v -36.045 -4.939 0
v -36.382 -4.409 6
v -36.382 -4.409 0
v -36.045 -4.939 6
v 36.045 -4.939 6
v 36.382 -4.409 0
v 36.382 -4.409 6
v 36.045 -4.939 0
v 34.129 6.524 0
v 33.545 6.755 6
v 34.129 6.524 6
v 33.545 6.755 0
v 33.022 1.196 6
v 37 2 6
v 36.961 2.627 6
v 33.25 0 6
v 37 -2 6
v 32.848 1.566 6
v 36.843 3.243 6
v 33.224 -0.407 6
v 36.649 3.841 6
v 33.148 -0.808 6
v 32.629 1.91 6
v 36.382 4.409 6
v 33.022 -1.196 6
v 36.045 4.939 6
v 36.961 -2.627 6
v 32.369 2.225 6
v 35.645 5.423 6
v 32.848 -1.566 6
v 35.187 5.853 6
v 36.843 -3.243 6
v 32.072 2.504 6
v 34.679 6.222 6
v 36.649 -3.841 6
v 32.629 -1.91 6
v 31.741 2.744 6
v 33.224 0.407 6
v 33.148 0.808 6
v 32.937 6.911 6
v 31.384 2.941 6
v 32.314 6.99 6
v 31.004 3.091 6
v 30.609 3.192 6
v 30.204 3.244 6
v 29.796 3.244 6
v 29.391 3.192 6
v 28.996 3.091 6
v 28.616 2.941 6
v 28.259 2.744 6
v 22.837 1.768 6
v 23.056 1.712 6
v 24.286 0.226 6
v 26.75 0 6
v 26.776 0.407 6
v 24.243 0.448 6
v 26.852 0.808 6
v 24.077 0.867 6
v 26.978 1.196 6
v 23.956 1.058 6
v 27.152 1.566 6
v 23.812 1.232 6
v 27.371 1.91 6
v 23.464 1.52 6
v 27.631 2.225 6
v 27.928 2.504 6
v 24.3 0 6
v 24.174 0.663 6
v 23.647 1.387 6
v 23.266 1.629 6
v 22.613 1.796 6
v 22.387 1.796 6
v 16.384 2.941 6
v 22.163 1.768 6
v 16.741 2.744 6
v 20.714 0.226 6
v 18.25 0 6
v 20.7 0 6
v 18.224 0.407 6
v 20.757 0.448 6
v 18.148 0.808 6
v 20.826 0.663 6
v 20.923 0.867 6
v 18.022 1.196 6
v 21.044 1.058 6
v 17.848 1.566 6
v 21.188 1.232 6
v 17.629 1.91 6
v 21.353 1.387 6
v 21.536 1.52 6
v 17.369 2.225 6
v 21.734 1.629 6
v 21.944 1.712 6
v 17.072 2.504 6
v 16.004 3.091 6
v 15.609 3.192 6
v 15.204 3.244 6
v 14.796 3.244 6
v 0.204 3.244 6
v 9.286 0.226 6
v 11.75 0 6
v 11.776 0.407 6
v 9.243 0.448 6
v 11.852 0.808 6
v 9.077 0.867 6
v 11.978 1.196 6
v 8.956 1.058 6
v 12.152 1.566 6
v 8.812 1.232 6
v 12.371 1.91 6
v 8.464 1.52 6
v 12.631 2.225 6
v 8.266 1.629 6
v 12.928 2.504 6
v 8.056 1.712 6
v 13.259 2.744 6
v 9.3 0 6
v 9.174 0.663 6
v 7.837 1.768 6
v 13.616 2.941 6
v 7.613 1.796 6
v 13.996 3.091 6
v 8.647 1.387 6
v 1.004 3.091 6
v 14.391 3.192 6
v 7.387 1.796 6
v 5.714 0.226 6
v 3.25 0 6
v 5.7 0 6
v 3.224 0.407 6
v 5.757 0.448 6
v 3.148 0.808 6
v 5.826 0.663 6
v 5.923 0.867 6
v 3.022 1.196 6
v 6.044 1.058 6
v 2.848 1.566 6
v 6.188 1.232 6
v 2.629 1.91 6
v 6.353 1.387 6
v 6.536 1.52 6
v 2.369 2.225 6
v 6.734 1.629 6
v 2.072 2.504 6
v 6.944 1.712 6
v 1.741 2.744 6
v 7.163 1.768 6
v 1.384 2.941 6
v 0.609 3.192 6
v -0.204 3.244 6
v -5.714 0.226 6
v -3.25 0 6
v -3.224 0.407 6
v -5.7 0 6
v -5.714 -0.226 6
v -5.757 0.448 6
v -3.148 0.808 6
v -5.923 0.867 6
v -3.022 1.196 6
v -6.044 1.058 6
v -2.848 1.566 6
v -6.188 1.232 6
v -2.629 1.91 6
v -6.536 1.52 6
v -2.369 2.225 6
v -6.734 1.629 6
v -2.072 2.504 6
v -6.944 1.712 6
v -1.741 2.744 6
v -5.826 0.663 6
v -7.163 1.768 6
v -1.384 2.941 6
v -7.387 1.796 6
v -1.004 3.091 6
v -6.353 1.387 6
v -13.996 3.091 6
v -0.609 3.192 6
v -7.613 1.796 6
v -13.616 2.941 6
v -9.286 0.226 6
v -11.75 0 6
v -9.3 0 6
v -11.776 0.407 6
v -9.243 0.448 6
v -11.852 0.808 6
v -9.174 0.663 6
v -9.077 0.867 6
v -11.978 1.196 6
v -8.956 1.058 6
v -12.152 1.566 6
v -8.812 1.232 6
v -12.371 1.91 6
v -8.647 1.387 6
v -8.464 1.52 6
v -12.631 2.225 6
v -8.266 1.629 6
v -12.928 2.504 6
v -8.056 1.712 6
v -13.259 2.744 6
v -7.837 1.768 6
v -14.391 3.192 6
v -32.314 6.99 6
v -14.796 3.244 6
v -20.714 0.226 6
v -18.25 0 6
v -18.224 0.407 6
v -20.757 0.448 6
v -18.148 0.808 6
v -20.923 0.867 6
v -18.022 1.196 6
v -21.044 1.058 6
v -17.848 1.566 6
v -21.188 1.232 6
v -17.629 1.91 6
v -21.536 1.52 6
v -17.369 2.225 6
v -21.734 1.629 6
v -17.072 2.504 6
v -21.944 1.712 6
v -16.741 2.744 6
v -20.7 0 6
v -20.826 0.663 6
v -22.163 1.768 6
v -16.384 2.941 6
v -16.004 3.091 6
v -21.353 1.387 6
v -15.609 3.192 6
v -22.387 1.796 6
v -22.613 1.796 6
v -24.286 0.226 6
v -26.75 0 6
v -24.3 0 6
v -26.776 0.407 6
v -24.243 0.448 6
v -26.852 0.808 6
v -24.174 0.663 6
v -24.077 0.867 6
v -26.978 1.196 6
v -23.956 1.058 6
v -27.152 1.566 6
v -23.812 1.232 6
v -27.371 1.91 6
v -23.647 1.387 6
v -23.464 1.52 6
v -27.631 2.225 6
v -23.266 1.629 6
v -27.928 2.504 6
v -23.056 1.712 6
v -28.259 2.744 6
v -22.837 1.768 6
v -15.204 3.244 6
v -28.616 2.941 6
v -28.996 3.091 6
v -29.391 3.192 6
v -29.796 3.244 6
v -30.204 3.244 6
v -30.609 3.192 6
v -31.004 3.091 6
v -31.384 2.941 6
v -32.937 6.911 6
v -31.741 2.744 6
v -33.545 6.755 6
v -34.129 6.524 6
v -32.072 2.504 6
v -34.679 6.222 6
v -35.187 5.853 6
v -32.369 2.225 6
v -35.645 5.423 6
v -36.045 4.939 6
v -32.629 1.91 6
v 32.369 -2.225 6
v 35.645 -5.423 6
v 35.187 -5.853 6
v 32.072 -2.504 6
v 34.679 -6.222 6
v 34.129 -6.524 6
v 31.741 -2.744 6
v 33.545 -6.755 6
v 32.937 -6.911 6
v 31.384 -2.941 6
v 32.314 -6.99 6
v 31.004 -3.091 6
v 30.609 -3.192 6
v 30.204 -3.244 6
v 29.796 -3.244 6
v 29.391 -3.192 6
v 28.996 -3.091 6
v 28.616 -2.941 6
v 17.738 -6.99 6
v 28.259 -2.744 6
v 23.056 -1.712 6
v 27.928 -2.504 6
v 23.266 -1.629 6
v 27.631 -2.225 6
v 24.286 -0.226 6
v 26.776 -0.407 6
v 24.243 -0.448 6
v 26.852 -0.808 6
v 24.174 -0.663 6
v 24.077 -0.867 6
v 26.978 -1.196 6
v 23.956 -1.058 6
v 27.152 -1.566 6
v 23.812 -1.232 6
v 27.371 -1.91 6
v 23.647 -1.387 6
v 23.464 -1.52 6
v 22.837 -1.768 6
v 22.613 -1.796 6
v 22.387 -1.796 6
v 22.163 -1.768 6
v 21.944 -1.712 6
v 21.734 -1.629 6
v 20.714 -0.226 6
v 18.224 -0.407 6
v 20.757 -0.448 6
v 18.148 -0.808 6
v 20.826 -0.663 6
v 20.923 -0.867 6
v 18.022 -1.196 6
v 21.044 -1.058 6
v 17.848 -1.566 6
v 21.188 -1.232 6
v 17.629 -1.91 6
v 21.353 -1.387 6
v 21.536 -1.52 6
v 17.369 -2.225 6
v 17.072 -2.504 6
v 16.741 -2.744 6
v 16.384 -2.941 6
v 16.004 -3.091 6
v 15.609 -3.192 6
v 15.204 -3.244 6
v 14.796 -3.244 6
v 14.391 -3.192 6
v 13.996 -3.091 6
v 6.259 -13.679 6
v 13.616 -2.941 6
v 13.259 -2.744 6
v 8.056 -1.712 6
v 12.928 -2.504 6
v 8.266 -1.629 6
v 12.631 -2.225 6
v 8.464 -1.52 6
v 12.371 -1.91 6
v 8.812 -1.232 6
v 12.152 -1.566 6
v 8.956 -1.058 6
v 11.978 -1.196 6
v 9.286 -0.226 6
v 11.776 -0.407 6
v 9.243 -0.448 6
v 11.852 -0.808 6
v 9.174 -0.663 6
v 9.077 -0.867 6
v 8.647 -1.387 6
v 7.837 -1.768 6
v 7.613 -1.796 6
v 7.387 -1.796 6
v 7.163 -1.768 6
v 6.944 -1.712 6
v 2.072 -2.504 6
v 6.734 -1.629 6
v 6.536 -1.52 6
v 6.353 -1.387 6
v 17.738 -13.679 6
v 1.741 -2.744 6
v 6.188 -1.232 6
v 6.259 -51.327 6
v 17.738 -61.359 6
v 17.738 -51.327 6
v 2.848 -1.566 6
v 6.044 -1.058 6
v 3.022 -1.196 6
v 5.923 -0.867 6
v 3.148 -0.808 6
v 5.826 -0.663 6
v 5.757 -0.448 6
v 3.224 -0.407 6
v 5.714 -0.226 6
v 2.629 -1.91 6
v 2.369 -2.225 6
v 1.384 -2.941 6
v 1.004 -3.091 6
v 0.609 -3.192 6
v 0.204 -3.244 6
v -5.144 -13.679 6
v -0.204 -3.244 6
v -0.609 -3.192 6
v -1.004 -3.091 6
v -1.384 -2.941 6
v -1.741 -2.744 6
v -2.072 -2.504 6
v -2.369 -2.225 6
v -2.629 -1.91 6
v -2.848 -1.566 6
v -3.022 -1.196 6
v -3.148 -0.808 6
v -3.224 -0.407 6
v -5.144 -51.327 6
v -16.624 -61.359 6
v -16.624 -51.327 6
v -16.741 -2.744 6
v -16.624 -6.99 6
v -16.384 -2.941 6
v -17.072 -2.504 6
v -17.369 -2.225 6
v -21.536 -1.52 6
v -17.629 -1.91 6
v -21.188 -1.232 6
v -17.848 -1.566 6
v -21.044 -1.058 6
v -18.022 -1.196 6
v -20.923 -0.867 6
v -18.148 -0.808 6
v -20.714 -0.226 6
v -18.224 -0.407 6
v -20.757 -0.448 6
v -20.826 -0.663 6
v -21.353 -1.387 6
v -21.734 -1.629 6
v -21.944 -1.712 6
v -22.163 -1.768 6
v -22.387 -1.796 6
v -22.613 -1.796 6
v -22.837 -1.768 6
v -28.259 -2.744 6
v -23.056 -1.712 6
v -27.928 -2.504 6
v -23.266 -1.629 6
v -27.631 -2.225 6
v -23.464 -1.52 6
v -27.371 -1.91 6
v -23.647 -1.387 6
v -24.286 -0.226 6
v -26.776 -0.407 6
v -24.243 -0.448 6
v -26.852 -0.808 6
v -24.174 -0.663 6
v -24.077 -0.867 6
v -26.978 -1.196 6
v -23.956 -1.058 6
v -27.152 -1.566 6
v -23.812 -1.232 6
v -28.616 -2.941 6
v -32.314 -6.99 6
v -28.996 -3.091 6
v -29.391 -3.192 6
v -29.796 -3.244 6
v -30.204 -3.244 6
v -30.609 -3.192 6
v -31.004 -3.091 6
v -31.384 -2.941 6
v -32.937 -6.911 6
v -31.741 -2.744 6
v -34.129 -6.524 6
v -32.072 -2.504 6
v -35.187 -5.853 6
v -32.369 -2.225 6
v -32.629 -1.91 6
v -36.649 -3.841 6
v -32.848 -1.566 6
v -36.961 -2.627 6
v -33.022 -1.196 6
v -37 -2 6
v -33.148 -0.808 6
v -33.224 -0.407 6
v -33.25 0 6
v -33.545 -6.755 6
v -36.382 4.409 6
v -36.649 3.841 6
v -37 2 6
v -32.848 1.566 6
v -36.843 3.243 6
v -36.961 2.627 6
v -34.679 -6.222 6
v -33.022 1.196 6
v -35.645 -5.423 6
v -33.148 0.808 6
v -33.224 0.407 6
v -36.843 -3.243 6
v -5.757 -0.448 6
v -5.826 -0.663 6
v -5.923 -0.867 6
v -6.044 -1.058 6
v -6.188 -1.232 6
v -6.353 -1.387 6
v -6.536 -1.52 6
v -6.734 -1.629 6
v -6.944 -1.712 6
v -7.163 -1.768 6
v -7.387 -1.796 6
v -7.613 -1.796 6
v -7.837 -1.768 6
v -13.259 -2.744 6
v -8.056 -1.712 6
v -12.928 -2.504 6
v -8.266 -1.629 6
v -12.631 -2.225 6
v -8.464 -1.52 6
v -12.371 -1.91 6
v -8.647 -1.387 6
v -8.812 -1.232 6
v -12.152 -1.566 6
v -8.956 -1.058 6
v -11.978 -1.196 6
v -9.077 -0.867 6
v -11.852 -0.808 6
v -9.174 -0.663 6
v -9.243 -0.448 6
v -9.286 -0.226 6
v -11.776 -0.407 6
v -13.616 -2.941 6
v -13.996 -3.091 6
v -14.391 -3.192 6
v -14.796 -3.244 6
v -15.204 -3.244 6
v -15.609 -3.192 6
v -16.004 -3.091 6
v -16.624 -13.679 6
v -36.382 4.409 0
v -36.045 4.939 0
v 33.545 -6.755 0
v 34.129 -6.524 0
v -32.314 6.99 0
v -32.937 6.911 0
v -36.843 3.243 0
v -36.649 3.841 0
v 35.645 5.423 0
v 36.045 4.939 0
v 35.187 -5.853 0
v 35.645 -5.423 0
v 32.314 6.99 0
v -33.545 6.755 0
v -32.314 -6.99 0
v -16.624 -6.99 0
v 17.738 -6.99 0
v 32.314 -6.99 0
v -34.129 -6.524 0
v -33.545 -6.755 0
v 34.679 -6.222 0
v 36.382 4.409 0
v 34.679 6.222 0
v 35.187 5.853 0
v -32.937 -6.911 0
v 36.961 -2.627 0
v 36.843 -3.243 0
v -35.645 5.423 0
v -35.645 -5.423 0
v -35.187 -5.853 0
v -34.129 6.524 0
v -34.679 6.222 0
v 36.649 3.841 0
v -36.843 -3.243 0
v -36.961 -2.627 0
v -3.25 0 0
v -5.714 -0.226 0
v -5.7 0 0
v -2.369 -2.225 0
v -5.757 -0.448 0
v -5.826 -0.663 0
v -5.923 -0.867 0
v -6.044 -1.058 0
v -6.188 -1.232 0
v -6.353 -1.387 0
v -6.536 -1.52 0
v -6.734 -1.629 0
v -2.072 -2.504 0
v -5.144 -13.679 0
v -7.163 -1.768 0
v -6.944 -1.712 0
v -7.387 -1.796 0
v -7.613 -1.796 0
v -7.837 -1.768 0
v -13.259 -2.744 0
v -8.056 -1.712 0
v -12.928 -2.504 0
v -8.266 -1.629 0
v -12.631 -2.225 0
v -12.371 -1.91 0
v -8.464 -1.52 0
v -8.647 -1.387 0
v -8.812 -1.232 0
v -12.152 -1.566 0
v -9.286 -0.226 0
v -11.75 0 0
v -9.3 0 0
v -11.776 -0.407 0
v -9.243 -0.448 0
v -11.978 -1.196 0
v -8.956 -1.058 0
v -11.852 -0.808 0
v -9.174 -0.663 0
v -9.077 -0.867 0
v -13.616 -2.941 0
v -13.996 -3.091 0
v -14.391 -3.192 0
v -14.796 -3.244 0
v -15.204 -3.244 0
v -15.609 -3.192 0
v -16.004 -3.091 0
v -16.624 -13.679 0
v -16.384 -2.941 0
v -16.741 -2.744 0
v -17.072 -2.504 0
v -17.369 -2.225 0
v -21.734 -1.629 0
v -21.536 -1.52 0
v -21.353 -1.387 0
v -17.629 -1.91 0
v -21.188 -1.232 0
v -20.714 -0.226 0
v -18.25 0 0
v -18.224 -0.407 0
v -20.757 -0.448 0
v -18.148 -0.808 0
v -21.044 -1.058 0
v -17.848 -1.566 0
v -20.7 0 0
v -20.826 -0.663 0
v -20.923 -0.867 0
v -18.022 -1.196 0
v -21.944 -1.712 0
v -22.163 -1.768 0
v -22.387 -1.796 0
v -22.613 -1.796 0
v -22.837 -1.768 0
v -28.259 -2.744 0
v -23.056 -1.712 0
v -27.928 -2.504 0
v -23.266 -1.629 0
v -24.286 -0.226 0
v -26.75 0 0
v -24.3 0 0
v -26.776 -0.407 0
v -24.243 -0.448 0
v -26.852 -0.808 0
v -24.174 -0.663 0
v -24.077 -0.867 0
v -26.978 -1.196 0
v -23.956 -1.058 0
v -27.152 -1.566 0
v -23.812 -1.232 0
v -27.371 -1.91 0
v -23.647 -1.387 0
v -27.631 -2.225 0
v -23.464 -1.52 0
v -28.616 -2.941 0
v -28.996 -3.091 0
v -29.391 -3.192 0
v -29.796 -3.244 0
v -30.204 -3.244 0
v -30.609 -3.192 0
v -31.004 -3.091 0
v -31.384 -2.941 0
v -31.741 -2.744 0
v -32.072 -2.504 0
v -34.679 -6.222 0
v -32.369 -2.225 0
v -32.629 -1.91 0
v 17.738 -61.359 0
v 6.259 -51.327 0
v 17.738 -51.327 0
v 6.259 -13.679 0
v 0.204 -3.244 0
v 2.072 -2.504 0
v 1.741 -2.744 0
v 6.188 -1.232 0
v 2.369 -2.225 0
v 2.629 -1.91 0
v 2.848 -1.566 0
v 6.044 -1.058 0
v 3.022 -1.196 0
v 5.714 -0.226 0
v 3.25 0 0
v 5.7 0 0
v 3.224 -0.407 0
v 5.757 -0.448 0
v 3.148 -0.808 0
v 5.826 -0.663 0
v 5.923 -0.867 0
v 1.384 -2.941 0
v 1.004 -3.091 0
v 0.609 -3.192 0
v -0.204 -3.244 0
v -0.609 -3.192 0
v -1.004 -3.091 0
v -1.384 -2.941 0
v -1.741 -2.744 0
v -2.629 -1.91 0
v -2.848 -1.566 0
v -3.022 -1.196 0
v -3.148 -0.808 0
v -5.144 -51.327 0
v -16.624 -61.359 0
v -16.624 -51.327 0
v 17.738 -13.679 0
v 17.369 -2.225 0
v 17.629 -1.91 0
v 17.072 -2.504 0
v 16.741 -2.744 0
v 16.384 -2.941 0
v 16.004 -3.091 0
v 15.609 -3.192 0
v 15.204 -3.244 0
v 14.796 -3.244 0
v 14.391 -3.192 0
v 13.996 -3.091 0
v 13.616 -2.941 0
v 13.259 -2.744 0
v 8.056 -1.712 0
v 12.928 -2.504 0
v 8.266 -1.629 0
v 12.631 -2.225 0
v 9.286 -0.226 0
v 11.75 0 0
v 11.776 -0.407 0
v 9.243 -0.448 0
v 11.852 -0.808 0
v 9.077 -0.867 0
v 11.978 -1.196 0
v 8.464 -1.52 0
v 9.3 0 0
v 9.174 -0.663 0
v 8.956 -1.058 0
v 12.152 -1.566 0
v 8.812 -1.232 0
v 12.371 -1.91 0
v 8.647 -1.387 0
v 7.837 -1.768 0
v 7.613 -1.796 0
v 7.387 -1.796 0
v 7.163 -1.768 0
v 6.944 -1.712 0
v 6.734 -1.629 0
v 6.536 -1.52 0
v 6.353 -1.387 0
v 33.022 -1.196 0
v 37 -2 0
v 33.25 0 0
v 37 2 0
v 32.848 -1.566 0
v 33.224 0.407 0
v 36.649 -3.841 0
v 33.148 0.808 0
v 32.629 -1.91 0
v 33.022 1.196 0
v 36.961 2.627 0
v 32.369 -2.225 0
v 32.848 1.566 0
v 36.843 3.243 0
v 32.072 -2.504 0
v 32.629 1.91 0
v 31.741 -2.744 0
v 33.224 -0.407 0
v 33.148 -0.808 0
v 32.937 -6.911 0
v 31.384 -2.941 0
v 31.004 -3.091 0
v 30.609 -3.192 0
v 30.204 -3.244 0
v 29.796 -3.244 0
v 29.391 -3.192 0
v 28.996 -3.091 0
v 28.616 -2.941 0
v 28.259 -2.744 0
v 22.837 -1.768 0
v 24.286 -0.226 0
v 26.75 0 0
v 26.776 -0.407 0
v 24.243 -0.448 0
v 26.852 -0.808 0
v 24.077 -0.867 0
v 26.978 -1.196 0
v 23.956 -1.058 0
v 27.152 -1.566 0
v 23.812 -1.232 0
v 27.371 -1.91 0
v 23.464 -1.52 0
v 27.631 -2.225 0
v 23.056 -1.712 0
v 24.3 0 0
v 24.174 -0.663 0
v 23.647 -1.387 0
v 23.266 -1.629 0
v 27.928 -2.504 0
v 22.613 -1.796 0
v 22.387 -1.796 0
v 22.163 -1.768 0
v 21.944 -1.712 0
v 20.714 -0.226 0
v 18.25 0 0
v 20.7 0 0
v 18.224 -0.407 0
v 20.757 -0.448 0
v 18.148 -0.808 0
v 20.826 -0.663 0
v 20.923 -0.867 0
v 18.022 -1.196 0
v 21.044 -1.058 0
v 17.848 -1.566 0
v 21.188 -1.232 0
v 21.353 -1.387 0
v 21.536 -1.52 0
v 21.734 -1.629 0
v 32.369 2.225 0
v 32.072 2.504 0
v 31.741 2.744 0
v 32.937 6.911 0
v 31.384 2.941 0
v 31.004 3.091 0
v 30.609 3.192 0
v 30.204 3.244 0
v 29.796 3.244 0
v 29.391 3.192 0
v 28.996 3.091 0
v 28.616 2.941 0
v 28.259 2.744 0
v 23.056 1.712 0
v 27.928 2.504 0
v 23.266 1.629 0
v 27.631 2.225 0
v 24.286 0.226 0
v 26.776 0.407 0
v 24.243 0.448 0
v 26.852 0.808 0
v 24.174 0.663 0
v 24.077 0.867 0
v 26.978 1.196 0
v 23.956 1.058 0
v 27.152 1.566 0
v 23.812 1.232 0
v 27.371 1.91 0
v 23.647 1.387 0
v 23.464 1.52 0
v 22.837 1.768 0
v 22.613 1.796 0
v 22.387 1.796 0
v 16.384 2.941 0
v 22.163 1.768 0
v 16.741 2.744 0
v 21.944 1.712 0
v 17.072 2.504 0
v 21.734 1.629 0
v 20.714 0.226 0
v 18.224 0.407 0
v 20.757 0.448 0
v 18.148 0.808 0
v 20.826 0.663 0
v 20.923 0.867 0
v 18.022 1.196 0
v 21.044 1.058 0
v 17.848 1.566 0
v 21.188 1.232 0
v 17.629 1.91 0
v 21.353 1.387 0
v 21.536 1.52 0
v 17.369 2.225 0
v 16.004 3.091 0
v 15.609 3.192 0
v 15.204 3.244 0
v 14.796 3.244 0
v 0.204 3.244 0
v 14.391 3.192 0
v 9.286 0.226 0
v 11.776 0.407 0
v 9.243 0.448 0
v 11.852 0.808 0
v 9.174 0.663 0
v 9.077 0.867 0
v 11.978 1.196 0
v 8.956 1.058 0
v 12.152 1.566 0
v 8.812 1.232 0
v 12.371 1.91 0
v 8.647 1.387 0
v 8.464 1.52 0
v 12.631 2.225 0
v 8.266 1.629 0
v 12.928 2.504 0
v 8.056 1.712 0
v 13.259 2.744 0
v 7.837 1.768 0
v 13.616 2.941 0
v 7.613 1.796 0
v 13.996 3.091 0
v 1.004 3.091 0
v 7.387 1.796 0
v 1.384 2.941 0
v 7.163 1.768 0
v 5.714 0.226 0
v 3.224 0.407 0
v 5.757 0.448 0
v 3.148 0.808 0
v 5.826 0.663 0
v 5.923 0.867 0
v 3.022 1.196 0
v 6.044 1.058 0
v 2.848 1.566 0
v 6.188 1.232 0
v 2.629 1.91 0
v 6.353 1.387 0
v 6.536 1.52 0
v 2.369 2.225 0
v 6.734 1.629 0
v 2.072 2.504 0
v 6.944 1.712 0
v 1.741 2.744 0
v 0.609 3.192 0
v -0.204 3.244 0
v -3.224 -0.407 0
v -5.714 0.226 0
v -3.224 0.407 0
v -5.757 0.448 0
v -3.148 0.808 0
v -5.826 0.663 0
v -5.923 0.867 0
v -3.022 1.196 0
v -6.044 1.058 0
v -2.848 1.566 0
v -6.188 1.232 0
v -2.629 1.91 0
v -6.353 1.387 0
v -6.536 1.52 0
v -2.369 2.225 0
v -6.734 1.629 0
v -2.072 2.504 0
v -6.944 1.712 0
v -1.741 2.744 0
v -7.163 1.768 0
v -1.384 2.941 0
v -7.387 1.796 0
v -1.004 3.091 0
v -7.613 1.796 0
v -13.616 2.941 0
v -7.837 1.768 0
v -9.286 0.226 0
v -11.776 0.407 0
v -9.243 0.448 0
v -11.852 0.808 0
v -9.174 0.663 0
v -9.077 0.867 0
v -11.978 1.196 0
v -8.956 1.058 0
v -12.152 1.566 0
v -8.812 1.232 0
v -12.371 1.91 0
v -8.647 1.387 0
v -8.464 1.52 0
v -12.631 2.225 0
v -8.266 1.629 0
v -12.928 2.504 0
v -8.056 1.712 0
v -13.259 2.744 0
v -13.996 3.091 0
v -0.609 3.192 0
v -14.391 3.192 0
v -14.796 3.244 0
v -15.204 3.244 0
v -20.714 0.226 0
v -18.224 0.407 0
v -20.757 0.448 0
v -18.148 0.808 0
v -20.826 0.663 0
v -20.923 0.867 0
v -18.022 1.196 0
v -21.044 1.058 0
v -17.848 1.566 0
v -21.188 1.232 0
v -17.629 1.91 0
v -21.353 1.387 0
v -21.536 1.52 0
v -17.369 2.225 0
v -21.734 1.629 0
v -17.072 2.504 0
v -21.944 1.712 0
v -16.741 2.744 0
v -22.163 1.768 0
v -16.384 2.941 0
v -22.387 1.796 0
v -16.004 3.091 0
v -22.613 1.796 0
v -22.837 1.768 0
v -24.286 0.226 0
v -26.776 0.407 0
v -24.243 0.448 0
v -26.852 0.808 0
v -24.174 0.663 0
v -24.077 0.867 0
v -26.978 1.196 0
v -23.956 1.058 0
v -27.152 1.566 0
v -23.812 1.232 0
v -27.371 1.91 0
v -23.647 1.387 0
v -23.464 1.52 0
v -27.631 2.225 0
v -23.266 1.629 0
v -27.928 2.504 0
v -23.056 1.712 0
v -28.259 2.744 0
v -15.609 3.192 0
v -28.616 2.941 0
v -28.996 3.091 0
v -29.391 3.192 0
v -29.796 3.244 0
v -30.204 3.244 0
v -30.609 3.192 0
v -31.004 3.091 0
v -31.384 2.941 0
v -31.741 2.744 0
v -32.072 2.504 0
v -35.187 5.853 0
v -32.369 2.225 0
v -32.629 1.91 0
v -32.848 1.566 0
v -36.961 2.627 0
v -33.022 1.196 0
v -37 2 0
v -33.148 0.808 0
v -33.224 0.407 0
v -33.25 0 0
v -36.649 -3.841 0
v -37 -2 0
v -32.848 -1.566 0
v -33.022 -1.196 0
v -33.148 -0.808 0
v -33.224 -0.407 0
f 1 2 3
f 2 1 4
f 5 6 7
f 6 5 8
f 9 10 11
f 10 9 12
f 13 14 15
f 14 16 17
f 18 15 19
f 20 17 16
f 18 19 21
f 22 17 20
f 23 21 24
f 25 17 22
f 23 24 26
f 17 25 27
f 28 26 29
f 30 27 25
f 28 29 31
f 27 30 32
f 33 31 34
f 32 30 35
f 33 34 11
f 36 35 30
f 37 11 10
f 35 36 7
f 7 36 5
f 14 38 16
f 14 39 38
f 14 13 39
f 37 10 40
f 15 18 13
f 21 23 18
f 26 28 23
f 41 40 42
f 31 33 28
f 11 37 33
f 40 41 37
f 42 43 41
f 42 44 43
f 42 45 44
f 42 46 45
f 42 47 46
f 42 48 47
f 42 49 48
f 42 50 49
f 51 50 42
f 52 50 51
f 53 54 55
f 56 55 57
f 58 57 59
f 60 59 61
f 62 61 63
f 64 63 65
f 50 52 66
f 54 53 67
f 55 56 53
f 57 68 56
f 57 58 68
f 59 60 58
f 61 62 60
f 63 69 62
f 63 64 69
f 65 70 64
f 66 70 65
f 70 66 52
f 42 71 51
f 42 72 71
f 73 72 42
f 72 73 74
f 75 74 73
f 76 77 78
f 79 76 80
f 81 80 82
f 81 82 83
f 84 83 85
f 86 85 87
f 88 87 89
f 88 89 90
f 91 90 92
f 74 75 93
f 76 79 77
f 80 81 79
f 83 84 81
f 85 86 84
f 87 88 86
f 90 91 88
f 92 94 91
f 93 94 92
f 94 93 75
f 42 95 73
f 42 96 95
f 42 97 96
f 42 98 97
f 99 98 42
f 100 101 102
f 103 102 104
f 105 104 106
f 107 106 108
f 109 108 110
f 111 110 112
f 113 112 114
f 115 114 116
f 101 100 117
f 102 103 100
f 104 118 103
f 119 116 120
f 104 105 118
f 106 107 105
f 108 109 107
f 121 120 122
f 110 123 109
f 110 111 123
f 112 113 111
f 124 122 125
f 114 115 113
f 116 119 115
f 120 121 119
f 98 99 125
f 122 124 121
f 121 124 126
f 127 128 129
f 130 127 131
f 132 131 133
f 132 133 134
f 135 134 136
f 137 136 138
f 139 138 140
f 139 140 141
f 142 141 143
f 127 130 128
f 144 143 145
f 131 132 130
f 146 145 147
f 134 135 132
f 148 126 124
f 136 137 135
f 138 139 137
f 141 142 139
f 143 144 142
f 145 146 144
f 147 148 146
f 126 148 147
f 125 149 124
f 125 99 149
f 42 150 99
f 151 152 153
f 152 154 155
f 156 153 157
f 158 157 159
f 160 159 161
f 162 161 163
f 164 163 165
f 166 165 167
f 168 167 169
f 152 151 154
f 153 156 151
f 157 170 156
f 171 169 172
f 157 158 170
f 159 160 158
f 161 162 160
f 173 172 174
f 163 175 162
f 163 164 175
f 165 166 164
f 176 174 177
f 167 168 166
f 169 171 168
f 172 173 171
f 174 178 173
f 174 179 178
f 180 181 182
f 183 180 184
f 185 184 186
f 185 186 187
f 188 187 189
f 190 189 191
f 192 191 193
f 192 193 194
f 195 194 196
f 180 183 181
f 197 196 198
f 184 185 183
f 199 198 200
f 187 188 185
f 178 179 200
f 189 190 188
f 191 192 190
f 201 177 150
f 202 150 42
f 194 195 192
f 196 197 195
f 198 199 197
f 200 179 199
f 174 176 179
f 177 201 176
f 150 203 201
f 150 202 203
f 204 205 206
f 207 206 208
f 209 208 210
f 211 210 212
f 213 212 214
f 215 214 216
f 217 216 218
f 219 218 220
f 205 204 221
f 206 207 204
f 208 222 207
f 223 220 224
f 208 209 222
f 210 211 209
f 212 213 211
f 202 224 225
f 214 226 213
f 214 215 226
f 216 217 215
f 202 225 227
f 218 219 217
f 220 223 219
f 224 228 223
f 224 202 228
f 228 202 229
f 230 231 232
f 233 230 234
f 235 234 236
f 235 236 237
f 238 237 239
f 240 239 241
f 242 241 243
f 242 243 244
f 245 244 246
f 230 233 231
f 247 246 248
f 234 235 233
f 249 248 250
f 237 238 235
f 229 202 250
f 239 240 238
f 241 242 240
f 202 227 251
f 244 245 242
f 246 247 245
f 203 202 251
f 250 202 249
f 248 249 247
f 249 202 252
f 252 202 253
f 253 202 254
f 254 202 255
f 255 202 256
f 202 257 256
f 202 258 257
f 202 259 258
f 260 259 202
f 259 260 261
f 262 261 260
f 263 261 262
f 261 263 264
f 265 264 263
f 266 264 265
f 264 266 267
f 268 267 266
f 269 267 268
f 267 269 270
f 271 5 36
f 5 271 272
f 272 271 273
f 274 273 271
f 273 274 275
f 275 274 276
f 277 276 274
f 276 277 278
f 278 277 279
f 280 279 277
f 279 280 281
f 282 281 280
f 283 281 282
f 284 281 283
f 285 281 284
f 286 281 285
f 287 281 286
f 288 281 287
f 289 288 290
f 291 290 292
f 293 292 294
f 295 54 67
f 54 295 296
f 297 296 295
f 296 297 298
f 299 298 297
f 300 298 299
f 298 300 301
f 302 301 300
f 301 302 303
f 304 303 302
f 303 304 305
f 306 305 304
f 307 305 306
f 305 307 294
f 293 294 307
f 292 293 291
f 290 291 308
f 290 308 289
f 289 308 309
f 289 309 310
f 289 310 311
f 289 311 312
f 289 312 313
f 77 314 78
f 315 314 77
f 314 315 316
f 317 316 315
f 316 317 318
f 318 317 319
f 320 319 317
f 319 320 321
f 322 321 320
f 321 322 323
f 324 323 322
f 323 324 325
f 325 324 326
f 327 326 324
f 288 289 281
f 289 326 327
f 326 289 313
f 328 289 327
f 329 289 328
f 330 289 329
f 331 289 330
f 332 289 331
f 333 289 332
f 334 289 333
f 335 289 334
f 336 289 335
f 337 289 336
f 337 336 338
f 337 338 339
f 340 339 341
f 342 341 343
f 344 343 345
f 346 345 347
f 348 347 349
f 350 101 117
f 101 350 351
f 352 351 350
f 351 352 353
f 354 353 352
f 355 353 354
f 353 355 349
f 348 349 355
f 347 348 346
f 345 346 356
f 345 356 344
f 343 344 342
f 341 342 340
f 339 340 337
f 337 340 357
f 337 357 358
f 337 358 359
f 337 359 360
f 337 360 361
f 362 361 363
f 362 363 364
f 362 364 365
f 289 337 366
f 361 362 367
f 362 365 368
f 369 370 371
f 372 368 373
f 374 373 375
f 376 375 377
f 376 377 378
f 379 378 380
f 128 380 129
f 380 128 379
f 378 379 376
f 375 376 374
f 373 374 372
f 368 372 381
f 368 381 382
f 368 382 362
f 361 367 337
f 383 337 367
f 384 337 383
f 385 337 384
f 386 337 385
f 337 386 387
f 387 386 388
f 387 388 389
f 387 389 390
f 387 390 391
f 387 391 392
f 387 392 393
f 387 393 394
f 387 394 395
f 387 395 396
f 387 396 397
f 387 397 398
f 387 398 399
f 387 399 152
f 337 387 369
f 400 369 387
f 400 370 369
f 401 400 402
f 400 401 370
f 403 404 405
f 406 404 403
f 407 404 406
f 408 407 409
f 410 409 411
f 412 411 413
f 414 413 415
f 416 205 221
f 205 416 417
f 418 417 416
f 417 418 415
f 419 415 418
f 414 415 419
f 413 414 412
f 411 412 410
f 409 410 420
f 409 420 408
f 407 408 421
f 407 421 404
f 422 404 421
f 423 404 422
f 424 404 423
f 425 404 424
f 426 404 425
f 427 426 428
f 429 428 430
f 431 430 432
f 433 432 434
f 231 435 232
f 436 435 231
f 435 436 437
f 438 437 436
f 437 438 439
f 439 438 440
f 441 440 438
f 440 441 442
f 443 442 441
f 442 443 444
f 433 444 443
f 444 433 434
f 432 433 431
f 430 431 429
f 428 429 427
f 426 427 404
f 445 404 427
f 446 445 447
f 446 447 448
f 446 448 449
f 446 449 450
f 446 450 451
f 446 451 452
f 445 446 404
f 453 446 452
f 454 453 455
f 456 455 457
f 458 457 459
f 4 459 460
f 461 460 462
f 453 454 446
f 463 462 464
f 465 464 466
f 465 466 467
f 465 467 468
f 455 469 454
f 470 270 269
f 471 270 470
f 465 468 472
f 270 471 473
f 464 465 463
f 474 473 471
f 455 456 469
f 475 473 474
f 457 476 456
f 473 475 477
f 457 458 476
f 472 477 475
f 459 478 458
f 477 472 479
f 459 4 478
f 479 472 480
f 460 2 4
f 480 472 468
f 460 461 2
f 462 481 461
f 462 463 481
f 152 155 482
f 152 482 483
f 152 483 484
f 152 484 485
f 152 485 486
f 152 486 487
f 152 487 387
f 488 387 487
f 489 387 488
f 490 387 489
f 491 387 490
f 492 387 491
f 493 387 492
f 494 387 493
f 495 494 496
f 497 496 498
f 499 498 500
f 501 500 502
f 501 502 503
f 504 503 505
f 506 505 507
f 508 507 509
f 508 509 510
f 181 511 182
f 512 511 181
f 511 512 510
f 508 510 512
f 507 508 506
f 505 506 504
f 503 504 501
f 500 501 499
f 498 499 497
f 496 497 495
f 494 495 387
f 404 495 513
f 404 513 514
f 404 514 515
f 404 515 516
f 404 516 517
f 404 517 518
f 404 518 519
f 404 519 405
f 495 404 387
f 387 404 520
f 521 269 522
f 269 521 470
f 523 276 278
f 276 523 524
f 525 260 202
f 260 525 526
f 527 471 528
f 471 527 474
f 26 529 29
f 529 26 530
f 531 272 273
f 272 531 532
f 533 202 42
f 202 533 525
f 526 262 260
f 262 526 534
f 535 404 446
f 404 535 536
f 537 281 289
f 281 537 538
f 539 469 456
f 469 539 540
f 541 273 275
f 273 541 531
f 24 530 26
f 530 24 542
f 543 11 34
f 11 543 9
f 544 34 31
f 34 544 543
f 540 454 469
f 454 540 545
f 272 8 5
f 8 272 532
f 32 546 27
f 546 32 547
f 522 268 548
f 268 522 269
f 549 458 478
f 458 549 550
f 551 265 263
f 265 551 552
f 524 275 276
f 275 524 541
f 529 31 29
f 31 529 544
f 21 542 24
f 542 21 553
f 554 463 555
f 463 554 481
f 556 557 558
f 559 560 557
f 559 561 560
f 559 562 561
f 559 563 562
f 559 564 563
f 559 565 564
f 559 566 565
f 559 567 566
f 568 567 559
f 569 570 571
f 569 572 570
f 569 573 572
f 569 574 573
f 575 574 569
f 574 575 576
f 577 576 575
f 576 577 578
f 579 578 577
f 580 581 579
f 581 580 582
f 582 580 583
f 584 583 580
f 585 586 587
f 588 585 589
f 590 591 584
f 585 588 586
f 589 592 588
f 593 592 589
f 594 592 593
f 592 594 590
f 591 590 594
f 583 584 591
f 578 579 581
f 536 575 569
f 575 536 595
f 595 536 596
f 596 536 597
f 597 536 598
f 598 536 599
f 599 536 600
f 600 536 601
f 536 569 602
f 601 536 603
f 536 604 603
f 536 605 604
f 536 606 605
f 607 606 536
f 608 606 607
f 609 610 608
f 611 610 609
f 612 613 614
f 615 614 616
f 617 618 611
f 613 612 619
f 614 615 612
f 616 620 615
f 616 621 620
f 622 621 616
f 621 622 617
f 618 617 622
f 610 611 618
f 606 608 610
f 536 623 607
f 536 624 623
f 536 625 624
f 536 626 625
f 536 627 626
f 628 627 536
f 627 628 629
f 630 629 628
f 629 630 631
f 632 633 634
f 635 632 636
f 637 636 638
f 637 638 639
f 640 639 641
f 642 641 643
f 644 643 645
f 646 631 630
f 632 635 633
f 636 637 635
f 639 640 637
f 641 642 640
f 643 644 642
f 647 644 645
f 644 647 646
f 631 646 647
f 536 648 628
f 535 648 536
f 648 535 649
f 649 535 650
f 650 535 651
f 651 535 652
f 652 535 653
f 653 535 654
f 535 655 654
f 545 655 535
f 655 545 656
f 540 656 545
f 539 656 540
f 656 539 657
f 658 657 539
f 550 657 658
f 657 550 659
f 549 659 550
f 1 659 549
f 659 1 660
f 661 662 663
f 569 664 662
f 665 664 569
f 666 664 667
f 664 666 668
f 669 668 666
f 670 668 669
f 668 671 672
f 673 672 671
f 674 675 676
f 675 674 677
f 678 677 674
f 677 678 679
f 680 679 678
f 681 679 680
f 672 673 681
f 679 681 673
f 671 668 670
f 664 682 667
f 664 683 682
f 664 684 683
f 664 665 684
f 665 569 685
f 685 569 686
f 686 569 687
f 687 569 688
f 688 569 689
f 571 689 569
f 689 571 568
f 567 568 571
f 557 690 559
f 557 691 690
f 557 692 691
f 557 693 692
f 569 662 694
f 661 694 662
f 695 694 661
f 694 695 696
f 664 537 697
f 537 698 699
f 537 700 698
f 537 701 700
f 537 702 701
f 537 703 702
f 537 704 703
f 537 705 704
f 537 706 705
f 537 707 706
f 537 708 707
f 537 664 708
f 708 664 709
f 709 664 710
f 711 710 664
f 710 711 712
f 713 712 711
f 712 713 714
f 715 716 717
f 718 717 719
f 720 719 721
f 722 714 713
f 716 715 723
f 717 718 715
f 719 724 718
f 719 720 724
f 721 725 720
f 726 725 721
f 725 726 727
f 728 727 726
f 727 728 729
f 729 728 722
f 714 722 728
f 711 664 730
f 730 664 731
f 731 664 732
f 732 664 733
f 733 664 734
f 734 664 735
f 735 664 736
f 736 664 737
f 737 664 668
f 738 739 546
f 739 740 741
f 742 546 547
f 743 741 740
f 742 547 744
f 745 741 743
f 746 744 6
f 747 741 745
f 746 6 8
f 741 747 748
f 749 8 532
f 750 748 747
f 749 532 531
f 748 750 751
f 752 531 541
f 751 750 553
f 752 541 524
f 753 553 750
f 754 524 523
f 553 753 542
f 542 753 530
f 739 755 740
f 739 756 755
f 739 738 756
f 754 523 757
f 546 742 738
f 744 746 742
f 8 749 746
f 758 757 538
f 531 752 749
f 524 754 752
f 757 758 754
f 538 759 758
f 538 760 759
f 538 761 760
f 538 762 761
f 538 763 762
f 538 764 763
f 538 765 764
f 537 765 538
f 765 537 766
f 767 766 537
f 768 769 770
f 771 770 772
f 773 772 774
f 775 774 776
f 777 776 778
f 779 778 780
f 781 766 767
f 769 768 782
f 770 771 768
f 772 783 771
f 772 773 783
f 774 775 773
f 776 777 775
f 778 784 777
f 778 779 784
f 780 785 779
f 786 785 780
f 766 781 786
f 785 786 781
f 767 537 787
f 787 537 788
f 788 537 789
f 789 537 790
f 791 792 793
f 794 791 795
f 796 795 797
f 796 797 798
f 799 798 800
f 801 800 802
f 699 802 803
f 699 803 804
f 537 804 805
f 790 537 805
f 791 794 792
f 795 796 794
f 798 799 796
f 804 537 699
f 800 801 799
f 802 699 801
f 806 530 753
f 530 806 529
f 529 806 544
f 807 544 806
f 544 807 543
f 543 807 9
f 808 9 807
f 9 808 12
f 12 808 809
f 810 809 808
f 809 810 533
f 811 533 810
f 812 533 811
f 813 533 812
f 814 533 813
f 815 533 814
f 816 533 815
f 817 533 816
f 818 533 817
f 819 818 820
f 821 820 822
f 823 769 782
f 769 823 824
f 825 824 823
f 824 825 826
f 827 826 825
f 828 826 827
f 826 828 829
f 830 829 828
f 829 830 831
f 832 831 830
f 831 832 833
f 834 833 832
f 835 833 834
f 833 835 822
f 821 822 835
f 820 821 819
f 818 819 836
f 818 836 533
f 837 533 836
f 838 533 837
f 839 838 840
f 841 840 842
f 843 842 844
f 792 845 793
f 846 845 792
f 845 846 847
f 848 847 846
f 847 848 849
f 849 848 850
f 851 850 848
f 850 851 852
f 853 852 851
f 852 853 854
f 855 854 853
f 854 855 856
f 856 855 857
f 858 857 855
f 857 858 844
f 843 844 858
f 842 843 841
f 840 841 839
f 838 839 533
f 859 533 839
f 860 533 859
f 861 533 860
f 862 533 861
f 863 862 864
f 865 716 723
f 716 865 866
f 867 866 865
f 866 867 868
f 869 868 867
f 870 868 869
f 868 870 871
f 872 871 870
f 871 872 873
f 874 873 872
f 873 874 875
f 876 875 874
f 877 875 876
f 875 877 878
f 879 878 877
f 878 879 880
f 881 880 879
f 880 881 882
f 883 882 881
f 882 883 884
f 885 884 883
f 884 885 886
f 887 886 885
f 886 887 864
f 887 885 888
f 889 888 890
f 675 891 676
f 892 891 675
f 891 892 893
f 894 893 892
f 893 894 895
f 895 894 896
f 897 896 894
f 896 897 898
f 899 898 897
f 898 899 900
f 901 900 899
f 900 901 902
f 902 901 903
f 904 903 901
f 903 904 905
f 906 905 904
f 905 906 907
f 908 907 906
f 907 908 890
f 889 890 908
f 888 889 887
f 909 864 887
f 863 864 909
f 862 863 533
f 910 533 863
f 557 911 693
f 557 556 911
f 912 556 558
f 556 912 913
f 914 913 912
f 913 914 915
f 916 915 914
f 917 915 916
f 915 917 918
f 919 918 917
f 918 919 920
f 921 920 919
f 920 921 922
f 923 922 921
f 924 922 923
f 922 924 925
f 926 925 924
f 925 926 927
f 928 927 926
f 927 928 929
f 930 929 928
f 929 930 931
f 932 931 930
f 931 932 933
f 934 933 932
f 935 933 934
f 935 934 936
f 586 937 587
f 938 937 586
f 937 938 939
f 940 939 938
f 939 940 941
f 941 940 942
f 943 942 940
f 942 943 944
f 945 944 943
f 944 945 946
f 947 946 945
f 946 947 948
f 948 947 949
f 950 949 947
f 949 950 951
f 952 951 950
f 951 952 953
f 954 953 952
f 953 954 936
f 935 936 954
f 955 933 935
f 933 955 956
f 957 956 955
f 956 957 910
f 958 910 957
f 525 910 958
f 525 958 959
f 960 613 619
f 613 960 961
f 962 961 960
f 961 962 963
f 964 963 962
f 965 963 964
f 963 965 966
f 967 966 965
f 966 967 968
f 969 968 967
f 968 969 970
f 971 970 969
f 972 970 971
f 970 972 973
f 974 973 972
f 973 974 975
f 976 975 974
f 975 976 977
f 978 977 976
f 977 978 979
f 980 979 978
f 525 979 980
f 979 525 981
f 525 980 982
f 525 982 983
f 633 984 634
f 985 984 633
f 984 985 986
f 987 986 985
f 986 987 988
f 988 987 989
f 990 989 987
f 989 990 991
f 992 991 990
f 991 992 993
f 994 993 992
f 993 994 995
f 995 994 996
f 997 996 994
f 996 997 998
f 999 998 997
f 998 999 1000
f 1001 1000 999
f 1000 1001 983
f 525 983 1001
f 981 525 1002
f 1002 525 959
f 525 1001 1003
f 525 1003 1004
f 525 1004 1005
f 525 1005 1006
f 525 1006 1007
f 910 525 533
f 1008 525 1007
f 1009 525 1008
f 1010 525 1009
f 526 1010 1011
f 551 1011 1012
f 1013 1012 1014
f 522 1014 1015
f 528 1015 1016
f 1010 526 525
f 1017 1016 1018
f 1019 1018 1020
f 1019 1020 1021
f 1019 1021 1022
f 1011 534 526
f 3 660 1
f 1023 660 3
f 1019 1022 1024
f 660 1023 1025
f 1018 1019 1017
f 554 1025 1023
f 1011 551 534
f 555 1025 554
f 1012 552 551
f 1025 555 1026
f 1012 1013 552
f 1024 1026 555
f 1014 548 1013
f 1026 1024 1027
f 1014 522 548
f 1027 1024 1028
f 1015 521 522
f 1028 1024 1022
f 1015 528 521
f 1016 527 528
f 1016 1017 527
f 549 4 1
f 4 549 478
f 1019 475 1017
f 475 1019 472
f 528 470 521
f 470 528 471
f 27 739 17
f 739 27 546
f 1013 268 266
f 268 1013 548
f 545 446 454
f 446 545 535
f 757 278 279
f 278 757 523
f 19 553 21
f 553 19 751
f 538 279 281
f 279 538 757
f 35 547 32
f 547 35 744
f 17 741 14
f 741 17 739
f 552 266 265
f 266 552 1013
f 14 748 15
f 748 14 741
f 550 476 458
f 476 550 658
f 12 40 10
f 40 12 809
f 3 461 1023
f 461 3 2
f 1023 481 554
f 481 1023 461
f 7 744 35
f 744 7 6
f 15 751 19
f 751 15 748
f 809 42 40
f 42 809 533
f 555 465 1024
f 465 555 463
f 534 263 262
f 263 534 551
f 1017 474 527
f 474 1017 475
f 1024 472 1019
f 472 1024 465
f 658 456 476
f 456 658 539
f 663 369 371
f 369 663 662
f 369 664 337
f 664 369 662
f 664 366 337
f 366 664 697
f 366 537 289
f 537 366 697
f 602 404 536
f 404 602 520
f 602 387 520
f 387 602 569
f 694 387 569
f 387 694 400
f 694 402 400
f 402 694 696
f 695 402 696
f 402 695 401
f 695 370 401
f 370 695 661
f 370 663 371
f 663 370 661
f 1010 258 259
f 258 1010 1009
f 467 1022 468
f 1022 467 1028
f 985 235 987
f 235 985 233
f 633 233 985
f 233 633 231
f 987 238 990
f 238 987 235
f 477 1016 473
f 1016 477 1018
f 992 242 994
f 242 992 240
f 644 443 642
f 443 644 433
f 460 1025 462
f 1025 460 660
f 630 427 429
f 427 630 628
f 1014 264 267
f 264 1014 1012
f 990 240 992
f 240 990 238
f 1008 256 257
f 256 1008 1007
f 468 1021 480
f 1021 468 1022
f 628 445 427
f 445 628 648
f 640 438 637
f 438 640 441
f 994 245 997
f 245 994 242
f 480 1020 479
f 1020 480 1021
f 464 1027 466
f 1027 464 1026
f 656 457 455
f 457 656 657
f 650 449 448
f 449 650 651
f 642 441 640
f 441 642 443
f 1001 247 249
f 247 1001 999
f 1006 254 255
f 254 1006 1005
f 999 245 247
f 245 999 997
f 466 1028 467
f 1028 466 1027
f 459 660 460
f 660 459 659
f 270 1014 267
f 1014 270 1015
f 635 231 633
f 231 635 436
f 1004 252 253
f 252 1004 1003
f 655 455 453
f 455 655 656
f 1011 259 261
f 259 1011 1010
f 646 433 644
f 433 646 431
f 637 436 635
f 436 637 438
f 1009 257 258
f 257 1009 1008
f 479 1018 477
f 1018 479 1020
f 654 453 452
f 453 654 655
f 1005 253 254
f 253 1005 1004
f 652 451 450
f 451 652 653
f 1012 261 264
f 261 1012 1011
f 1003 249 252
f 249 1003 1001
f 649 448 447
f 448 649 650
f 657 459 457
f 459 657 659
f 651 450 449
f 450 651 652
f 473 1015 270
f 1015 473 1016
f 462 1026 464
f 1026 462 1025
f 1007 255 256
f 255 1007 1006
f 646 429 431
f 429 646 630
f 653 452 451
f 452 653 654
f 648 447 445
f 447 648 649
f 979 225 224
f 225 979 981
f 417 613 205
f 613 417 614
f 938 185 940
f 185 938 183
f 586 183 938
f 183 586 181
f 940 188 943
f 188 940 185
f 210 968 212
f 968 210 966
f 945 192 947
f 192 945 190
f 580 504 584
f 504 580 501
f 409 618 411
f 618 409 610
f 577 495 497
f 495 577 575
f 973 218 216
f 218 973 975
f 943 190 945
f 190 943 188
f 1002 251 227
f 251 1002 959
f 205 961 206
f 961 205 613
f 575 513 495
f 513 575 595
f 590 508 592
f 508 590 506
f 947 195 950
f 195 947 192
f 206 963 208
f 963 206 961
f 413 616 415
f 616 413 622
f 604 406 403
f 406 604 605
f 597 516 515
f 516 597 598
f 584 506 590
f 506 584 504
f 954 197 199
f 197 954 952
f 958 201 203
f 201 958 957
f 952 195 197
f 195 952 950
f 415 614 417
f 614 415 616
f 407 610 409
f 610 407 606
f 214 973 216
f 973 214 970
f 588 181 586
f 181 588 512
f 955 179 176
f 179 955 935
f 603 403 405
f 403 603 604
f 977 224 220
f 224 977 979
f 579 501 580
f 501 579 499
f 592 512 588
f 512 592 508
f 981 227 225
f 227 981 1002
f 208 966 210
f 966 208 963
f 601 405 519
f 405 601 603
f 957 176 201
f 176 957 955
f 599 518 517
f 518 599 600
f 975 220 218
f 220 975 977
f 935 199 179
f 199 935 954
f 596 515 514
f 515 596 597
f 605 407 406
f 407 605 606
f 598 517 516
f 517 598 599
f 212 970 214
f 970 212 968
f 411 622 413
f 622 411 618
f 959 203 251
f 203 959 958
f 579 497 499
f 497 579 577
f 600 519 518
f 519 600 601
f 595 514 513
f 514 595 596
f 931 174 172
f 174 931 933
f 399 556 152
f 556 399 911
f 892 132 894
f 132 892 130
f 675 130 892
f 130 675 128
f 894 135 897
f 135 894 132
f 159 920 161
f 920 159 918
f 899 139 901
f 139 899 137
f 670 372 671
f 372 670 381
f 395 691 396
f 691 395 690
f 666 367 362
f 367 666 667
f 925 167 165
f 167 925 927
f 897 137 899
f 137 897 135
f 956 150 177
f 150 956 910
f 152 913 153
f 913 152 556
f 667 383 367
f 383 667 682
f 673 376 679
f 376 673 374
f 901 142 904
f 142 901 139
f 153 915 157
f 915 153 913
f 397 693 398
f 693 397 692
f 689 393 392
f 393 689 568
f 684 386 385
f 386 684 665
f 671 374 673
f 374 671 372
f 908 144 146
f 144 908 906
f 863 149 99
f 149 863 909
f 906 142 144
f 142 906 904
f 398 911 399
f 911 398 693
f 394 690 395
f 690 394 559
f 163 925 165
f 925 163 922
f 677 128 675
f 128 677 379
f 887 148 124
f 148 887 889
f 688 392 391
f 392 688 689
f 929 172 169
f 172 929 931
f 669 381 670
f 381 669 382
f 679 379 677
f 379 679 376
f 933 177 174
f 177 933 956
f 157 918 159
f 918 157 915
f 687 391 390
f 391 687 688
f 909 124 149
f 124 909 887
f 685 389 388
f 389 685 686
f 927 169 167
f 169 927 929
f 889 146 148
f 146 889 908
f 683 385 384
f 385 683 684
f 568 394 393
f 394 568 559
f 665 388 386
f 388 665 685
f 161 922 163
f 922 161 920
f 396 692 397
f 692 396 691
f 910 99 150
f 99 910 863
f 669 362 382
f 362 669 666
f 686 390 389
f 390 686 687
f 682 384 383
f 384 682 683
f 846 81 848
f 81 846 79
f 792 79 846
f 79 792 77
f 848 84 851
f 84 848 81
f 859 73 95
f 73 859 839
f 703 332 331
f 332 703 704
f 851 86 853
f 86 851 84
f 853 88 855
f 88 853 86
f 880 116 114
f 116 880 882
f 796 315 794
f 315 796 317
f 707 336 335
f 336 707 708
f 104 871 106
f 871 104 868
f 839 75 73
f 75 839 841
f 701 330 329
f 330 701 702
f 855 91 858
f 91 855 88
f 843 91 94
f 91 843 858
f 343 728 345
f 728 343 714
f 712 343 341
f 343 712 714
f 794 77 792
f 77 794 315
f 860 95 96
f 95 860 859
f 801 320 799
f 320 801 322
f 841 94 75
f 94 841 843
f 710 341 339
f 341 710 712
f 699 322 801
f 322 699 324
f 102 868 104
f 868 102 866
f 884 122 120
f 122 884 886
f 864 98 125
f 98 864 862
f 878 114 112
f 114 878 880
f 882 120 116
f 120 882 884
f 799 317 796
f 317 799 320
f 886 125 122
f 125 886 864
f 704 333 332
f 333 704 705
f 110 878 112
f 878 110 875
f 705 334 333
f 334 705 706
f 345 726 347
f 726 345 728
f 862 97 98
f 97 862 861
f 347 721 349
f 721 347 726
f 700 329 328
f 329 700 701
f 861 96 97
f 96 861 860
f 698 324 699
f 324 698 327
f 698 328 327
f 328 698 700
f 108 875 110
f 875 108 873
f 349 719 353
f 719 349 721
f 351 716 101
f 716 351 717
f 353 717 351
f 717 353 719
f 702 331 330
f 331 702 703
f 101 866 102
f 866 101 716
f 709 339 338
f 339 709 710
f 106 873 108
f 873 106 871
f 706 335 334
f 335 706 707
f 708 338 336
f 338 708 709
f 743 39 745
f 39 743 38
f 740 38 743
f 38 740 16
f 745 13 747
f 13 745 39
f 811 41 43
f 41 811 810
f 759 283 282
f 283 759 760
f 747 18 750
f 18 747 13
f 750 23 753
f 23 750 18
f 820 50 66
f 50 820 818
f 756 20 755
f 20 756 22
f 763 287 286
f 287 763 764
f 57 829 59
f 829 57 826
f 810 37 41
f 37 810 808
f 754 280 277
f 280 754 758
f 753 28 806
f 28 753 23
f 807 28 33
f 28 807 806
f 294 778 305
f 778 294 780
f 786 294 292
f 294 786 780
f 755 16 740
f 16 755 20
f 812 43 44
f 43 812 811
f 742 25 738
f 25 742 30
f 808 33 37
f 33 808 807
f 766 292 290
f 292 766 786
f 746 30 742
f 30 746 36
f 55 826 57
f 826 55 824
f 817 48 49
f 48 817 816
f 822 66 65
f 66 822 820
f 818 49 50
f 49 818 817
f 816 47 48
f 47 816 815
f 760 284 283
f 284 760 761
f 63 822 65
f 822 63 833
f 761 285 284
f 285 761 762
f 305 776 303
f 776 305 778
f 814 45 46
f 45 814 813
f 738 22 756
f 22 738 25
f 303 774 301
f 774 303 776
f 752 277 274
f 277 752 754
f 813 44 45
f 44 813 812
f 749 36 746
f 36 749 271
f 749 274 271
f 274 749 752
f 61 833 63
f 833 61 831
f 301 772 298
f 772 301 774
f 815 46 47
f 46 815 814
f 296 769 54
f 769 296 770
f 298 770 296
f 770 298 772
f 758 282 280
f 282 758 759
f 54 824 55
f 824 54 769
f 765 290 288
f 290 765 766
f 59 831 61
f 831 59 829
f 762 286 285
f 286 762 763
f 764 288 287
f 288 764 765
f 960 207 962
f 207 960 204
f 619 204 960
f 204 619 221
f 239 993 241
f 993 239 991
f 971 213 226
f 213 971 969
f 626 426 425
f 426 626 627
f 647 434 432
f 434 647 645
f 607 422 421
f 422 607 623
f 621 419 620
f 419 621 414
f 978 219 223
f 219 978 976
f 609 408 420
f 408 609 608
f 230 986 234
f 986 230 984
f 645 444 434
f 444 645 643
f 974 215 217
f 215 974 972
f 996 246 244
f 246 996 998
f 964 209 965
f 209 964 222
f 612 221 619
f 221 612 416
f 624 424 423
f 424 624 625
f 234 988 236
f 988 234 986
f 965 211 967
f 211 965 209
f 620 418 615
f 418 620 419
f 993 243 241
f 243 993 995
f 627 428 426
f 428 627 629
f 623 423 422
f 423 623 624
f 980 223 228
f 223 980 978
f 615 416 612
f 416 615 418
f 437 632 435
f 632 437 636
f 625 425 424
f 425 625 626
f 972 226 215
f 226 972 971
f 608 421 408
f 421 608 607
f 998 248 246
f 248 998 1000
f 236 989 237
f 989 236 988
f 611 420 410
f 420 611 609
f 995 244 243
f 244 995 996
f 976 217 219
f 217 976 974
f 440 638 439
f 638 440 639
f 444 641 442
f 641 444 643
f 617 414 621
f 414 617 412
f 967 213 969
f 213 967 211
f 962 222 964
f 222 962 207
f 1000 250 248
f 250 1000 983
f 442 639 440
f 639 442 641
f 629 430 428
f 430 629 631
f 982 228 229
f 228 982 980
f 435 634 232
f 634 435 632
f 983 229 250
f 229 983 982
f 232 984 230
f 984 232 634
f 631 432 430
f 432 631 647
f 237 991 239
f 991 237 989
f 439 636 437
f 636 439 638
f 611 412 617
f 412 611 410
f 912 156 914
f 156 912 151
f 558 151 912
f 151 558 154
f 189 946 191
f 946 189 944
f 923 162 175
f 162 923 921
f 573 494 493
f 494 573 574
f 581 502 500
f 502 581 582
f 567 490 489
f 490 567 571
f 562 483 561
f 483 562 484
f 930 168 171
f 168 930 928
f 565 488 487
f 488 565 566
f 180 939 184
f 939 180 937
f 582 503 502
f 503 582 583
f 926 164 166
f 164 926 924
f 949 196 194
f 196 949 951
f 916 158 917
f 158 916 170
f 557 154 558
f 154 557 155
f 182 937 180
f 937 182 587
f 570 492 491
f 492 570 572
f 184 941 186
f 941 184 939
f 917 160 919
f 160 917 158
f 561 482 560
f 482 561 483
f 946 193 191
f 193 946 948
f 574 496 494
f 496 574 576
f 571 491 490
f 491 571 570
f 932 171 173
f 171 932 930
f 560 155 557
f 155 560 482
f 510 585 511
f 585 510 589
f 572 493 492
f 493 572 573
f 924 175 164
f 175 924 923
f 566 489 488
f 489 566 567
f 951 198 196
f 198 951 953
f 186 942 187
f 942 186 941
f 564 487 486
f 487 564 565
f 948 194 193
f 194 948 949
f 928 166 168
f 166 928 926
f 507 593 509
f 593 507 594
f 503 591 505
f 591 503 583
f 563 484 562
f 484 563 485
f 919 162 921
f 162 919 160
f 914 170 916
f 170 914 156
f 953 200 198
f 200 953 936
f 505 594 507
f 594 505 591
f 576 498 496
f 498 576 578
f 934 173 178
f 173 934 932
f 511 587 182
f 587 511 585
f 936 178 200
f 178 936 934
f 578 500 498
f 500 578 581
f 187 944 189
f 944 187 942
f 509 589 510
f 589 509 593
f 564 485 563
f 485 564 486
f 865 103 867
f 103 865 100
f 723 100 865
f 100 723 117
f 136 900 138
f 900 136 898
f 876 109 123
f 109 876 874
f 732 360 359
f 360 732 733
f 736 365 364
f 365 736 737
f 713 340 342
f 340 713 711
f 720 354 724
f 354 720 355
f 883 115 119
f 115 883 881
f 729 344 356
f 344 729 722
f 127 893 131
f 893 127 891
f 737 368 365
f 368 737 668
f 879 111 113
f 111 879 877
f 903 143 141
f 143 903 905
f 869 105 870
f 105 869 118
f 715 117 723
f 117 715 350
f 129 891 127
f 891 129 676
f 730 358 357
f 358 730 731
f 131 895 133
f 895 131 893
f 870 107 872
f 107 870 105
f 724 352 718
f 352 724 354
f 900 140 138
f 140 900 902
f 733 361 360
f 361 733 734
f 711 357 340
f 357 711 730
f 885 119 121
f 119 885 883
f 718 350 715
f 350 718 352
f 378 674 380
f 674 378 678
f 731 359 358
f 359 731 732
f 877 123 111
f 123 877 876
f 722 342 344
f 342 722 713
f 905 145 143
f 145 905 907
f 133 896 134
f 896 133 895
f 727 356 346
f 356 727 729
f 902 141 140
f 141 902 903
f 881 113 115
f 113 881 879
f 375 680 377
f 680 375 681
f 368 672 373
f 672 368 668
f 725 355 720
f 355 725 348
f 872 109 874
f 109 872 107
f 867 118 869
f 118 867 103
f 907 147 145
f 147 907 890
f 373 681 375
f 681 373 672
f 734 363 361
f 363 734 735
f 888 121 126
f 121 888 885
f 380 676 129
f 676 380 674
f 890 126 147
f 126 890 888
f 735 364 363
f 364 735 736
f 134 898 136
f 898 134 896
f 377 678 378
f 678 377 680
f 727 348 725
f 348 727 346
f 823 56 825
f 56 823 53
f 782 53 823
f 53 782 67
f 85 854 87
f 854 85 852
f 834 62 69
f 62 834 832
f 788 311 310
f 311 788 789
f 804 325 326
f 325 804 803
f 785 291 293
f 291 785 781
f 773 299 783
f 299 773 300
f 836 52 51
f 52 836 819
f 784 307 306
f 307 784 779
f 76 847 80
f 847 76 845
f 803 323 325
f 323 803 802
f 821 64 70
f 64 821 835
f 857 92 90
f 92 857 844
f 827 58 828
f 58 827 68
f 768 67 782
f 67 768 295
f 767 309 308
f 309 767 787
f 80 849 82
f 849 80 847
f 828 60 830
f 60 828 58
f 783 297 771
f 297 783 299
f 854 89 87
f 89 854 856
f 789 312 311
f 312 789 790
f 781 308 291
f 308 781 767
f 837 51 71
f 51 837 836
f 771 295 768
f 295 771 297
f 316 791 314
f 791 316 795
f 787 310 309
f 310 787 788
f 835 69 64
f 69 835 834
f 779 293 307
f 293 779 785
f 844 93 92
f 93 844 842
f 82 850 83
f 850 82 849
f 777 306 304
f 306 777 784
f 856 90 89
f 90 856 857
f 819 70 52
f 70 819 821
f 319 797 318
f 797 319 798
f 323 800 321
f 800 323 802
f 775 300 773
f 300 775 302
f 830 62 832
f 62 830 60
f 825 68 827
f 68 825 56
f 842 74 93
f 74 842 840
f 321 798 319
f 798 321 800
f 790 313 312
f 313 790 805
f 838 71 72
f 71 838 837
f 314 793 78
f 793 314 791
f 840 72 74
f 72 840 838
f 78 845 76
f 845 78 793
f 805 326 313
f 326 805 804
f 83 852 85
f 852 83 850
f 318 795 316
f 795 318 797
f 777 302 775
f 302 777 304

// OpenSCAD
$fn = 50;


difference() {
	union() {
		hull() {
			translate(v = [-32.0000000000, 2.0000000000, 0]) {
				cylinder(h = 6, r = 5);
			}
			translate(v = [32.0000000000, 2.0000000000, 0]) {
				cylinder(h = 6, r = 5);
			}
			translate(v = [-32.0000000000, -2.0000000000, 0]) {
				cylinder(h = 6, r = 5);
			}
			translate(v = [32.0000000000, -2.0000000000, 0]) {
				cylinder(h = 6, r = 5);
			}
		}
		translate(v = [0, -5, 0]) {
			linear_extrude(height = 6) {
				text(font = "DejaVu Sans Mono:style=Bold", halign = "center", size = 57.0000000000, text = "I", valign = "top");
			}
		}
	}
	union() {
		translate(v = [-30.0000000000, 0.0000000000, 0]) {
			translate(v = [0, 0, -100]) {
				cylinder(h = 200, r = 3.2500000000);
			}
		}
		translate(v = [-15.0000000000, 0.0000000000, 0]) {
			translate(v = [0, 0, -100]) {
				cylinder(h = 200, r = 3.2500000000);
			}
		}
		translate(v = [0, 0, -100]) {
			cylinder(h = 200, r = 3.2500000000);
		}
		translate(v = [15.0000000000, 0.0000000000, 0]) {
			translate(v = [0, 0, -100]) {
				cylinder(h = 200, r = 3.2500000000);
			}
		}
		translate(v = [30.0000000000, 0.0000000000, 0]) {
			translate(v = [0, 0, -100]) {
				cylinder(h = 200, r = 3.2500000000);
			}
		}
		translate(v = [-30.0000000000, 0.0000000000, 0]) {
			translate(v = [0, 0, -100]) {
				cylinder(h = 200, r = 1.8000000000);
			}
		}
		translate(v = [-22.5000000000, 0.0000000000, 0]) {
			translate(v = [0, 0, -100]) {
				cylinder(h = 200, r = 1.8000000000);
			}
		}
		translate(v = [-15.0000000000, 0.0000000000, 0]) {
			translate(v = [0, 0, -100]) {
				cylinder(h = 200, r = 1.8000000000);
			}
		}
		translate(v = [-7.5000000000, 0.0000000000, 0]) {
			translate(v = [0, 0, -100]) {
				cylinder(h = 200, r = 1.8000000000);
			}
		}
		translate(v = [0, 0, -100]) {
			cylinder(h = 200, r = 1.8000000000);
		}
		translate(v = [7.5000000000, 0.0000000000, 0]) {
			translate(v = [0, 0, -100]) {
				cylinder(h = 200, r = 1.8000000000);
			}
		}
		translate(v = [15.0000000000, 0.0000000000, 0]) {
			translate(v = [0, 0, -100]) {
				cylinder(h = 200, r = 1.8000000000);
			}
		}
		translate(v = [22.5000000000, 0.0000000000, 0]) {
			translate(v = [0, 0, -100]) {
				cylinder(h = 200, r = 1.8000000000);
			}
		}
		translate(v = [30.0000000000, 0.0000000000, 0]) {
			translate(v = [0, 0, -100]) {
				cylinder(h = 200, r = 1.8000000000);
			}
		}
	}
}
